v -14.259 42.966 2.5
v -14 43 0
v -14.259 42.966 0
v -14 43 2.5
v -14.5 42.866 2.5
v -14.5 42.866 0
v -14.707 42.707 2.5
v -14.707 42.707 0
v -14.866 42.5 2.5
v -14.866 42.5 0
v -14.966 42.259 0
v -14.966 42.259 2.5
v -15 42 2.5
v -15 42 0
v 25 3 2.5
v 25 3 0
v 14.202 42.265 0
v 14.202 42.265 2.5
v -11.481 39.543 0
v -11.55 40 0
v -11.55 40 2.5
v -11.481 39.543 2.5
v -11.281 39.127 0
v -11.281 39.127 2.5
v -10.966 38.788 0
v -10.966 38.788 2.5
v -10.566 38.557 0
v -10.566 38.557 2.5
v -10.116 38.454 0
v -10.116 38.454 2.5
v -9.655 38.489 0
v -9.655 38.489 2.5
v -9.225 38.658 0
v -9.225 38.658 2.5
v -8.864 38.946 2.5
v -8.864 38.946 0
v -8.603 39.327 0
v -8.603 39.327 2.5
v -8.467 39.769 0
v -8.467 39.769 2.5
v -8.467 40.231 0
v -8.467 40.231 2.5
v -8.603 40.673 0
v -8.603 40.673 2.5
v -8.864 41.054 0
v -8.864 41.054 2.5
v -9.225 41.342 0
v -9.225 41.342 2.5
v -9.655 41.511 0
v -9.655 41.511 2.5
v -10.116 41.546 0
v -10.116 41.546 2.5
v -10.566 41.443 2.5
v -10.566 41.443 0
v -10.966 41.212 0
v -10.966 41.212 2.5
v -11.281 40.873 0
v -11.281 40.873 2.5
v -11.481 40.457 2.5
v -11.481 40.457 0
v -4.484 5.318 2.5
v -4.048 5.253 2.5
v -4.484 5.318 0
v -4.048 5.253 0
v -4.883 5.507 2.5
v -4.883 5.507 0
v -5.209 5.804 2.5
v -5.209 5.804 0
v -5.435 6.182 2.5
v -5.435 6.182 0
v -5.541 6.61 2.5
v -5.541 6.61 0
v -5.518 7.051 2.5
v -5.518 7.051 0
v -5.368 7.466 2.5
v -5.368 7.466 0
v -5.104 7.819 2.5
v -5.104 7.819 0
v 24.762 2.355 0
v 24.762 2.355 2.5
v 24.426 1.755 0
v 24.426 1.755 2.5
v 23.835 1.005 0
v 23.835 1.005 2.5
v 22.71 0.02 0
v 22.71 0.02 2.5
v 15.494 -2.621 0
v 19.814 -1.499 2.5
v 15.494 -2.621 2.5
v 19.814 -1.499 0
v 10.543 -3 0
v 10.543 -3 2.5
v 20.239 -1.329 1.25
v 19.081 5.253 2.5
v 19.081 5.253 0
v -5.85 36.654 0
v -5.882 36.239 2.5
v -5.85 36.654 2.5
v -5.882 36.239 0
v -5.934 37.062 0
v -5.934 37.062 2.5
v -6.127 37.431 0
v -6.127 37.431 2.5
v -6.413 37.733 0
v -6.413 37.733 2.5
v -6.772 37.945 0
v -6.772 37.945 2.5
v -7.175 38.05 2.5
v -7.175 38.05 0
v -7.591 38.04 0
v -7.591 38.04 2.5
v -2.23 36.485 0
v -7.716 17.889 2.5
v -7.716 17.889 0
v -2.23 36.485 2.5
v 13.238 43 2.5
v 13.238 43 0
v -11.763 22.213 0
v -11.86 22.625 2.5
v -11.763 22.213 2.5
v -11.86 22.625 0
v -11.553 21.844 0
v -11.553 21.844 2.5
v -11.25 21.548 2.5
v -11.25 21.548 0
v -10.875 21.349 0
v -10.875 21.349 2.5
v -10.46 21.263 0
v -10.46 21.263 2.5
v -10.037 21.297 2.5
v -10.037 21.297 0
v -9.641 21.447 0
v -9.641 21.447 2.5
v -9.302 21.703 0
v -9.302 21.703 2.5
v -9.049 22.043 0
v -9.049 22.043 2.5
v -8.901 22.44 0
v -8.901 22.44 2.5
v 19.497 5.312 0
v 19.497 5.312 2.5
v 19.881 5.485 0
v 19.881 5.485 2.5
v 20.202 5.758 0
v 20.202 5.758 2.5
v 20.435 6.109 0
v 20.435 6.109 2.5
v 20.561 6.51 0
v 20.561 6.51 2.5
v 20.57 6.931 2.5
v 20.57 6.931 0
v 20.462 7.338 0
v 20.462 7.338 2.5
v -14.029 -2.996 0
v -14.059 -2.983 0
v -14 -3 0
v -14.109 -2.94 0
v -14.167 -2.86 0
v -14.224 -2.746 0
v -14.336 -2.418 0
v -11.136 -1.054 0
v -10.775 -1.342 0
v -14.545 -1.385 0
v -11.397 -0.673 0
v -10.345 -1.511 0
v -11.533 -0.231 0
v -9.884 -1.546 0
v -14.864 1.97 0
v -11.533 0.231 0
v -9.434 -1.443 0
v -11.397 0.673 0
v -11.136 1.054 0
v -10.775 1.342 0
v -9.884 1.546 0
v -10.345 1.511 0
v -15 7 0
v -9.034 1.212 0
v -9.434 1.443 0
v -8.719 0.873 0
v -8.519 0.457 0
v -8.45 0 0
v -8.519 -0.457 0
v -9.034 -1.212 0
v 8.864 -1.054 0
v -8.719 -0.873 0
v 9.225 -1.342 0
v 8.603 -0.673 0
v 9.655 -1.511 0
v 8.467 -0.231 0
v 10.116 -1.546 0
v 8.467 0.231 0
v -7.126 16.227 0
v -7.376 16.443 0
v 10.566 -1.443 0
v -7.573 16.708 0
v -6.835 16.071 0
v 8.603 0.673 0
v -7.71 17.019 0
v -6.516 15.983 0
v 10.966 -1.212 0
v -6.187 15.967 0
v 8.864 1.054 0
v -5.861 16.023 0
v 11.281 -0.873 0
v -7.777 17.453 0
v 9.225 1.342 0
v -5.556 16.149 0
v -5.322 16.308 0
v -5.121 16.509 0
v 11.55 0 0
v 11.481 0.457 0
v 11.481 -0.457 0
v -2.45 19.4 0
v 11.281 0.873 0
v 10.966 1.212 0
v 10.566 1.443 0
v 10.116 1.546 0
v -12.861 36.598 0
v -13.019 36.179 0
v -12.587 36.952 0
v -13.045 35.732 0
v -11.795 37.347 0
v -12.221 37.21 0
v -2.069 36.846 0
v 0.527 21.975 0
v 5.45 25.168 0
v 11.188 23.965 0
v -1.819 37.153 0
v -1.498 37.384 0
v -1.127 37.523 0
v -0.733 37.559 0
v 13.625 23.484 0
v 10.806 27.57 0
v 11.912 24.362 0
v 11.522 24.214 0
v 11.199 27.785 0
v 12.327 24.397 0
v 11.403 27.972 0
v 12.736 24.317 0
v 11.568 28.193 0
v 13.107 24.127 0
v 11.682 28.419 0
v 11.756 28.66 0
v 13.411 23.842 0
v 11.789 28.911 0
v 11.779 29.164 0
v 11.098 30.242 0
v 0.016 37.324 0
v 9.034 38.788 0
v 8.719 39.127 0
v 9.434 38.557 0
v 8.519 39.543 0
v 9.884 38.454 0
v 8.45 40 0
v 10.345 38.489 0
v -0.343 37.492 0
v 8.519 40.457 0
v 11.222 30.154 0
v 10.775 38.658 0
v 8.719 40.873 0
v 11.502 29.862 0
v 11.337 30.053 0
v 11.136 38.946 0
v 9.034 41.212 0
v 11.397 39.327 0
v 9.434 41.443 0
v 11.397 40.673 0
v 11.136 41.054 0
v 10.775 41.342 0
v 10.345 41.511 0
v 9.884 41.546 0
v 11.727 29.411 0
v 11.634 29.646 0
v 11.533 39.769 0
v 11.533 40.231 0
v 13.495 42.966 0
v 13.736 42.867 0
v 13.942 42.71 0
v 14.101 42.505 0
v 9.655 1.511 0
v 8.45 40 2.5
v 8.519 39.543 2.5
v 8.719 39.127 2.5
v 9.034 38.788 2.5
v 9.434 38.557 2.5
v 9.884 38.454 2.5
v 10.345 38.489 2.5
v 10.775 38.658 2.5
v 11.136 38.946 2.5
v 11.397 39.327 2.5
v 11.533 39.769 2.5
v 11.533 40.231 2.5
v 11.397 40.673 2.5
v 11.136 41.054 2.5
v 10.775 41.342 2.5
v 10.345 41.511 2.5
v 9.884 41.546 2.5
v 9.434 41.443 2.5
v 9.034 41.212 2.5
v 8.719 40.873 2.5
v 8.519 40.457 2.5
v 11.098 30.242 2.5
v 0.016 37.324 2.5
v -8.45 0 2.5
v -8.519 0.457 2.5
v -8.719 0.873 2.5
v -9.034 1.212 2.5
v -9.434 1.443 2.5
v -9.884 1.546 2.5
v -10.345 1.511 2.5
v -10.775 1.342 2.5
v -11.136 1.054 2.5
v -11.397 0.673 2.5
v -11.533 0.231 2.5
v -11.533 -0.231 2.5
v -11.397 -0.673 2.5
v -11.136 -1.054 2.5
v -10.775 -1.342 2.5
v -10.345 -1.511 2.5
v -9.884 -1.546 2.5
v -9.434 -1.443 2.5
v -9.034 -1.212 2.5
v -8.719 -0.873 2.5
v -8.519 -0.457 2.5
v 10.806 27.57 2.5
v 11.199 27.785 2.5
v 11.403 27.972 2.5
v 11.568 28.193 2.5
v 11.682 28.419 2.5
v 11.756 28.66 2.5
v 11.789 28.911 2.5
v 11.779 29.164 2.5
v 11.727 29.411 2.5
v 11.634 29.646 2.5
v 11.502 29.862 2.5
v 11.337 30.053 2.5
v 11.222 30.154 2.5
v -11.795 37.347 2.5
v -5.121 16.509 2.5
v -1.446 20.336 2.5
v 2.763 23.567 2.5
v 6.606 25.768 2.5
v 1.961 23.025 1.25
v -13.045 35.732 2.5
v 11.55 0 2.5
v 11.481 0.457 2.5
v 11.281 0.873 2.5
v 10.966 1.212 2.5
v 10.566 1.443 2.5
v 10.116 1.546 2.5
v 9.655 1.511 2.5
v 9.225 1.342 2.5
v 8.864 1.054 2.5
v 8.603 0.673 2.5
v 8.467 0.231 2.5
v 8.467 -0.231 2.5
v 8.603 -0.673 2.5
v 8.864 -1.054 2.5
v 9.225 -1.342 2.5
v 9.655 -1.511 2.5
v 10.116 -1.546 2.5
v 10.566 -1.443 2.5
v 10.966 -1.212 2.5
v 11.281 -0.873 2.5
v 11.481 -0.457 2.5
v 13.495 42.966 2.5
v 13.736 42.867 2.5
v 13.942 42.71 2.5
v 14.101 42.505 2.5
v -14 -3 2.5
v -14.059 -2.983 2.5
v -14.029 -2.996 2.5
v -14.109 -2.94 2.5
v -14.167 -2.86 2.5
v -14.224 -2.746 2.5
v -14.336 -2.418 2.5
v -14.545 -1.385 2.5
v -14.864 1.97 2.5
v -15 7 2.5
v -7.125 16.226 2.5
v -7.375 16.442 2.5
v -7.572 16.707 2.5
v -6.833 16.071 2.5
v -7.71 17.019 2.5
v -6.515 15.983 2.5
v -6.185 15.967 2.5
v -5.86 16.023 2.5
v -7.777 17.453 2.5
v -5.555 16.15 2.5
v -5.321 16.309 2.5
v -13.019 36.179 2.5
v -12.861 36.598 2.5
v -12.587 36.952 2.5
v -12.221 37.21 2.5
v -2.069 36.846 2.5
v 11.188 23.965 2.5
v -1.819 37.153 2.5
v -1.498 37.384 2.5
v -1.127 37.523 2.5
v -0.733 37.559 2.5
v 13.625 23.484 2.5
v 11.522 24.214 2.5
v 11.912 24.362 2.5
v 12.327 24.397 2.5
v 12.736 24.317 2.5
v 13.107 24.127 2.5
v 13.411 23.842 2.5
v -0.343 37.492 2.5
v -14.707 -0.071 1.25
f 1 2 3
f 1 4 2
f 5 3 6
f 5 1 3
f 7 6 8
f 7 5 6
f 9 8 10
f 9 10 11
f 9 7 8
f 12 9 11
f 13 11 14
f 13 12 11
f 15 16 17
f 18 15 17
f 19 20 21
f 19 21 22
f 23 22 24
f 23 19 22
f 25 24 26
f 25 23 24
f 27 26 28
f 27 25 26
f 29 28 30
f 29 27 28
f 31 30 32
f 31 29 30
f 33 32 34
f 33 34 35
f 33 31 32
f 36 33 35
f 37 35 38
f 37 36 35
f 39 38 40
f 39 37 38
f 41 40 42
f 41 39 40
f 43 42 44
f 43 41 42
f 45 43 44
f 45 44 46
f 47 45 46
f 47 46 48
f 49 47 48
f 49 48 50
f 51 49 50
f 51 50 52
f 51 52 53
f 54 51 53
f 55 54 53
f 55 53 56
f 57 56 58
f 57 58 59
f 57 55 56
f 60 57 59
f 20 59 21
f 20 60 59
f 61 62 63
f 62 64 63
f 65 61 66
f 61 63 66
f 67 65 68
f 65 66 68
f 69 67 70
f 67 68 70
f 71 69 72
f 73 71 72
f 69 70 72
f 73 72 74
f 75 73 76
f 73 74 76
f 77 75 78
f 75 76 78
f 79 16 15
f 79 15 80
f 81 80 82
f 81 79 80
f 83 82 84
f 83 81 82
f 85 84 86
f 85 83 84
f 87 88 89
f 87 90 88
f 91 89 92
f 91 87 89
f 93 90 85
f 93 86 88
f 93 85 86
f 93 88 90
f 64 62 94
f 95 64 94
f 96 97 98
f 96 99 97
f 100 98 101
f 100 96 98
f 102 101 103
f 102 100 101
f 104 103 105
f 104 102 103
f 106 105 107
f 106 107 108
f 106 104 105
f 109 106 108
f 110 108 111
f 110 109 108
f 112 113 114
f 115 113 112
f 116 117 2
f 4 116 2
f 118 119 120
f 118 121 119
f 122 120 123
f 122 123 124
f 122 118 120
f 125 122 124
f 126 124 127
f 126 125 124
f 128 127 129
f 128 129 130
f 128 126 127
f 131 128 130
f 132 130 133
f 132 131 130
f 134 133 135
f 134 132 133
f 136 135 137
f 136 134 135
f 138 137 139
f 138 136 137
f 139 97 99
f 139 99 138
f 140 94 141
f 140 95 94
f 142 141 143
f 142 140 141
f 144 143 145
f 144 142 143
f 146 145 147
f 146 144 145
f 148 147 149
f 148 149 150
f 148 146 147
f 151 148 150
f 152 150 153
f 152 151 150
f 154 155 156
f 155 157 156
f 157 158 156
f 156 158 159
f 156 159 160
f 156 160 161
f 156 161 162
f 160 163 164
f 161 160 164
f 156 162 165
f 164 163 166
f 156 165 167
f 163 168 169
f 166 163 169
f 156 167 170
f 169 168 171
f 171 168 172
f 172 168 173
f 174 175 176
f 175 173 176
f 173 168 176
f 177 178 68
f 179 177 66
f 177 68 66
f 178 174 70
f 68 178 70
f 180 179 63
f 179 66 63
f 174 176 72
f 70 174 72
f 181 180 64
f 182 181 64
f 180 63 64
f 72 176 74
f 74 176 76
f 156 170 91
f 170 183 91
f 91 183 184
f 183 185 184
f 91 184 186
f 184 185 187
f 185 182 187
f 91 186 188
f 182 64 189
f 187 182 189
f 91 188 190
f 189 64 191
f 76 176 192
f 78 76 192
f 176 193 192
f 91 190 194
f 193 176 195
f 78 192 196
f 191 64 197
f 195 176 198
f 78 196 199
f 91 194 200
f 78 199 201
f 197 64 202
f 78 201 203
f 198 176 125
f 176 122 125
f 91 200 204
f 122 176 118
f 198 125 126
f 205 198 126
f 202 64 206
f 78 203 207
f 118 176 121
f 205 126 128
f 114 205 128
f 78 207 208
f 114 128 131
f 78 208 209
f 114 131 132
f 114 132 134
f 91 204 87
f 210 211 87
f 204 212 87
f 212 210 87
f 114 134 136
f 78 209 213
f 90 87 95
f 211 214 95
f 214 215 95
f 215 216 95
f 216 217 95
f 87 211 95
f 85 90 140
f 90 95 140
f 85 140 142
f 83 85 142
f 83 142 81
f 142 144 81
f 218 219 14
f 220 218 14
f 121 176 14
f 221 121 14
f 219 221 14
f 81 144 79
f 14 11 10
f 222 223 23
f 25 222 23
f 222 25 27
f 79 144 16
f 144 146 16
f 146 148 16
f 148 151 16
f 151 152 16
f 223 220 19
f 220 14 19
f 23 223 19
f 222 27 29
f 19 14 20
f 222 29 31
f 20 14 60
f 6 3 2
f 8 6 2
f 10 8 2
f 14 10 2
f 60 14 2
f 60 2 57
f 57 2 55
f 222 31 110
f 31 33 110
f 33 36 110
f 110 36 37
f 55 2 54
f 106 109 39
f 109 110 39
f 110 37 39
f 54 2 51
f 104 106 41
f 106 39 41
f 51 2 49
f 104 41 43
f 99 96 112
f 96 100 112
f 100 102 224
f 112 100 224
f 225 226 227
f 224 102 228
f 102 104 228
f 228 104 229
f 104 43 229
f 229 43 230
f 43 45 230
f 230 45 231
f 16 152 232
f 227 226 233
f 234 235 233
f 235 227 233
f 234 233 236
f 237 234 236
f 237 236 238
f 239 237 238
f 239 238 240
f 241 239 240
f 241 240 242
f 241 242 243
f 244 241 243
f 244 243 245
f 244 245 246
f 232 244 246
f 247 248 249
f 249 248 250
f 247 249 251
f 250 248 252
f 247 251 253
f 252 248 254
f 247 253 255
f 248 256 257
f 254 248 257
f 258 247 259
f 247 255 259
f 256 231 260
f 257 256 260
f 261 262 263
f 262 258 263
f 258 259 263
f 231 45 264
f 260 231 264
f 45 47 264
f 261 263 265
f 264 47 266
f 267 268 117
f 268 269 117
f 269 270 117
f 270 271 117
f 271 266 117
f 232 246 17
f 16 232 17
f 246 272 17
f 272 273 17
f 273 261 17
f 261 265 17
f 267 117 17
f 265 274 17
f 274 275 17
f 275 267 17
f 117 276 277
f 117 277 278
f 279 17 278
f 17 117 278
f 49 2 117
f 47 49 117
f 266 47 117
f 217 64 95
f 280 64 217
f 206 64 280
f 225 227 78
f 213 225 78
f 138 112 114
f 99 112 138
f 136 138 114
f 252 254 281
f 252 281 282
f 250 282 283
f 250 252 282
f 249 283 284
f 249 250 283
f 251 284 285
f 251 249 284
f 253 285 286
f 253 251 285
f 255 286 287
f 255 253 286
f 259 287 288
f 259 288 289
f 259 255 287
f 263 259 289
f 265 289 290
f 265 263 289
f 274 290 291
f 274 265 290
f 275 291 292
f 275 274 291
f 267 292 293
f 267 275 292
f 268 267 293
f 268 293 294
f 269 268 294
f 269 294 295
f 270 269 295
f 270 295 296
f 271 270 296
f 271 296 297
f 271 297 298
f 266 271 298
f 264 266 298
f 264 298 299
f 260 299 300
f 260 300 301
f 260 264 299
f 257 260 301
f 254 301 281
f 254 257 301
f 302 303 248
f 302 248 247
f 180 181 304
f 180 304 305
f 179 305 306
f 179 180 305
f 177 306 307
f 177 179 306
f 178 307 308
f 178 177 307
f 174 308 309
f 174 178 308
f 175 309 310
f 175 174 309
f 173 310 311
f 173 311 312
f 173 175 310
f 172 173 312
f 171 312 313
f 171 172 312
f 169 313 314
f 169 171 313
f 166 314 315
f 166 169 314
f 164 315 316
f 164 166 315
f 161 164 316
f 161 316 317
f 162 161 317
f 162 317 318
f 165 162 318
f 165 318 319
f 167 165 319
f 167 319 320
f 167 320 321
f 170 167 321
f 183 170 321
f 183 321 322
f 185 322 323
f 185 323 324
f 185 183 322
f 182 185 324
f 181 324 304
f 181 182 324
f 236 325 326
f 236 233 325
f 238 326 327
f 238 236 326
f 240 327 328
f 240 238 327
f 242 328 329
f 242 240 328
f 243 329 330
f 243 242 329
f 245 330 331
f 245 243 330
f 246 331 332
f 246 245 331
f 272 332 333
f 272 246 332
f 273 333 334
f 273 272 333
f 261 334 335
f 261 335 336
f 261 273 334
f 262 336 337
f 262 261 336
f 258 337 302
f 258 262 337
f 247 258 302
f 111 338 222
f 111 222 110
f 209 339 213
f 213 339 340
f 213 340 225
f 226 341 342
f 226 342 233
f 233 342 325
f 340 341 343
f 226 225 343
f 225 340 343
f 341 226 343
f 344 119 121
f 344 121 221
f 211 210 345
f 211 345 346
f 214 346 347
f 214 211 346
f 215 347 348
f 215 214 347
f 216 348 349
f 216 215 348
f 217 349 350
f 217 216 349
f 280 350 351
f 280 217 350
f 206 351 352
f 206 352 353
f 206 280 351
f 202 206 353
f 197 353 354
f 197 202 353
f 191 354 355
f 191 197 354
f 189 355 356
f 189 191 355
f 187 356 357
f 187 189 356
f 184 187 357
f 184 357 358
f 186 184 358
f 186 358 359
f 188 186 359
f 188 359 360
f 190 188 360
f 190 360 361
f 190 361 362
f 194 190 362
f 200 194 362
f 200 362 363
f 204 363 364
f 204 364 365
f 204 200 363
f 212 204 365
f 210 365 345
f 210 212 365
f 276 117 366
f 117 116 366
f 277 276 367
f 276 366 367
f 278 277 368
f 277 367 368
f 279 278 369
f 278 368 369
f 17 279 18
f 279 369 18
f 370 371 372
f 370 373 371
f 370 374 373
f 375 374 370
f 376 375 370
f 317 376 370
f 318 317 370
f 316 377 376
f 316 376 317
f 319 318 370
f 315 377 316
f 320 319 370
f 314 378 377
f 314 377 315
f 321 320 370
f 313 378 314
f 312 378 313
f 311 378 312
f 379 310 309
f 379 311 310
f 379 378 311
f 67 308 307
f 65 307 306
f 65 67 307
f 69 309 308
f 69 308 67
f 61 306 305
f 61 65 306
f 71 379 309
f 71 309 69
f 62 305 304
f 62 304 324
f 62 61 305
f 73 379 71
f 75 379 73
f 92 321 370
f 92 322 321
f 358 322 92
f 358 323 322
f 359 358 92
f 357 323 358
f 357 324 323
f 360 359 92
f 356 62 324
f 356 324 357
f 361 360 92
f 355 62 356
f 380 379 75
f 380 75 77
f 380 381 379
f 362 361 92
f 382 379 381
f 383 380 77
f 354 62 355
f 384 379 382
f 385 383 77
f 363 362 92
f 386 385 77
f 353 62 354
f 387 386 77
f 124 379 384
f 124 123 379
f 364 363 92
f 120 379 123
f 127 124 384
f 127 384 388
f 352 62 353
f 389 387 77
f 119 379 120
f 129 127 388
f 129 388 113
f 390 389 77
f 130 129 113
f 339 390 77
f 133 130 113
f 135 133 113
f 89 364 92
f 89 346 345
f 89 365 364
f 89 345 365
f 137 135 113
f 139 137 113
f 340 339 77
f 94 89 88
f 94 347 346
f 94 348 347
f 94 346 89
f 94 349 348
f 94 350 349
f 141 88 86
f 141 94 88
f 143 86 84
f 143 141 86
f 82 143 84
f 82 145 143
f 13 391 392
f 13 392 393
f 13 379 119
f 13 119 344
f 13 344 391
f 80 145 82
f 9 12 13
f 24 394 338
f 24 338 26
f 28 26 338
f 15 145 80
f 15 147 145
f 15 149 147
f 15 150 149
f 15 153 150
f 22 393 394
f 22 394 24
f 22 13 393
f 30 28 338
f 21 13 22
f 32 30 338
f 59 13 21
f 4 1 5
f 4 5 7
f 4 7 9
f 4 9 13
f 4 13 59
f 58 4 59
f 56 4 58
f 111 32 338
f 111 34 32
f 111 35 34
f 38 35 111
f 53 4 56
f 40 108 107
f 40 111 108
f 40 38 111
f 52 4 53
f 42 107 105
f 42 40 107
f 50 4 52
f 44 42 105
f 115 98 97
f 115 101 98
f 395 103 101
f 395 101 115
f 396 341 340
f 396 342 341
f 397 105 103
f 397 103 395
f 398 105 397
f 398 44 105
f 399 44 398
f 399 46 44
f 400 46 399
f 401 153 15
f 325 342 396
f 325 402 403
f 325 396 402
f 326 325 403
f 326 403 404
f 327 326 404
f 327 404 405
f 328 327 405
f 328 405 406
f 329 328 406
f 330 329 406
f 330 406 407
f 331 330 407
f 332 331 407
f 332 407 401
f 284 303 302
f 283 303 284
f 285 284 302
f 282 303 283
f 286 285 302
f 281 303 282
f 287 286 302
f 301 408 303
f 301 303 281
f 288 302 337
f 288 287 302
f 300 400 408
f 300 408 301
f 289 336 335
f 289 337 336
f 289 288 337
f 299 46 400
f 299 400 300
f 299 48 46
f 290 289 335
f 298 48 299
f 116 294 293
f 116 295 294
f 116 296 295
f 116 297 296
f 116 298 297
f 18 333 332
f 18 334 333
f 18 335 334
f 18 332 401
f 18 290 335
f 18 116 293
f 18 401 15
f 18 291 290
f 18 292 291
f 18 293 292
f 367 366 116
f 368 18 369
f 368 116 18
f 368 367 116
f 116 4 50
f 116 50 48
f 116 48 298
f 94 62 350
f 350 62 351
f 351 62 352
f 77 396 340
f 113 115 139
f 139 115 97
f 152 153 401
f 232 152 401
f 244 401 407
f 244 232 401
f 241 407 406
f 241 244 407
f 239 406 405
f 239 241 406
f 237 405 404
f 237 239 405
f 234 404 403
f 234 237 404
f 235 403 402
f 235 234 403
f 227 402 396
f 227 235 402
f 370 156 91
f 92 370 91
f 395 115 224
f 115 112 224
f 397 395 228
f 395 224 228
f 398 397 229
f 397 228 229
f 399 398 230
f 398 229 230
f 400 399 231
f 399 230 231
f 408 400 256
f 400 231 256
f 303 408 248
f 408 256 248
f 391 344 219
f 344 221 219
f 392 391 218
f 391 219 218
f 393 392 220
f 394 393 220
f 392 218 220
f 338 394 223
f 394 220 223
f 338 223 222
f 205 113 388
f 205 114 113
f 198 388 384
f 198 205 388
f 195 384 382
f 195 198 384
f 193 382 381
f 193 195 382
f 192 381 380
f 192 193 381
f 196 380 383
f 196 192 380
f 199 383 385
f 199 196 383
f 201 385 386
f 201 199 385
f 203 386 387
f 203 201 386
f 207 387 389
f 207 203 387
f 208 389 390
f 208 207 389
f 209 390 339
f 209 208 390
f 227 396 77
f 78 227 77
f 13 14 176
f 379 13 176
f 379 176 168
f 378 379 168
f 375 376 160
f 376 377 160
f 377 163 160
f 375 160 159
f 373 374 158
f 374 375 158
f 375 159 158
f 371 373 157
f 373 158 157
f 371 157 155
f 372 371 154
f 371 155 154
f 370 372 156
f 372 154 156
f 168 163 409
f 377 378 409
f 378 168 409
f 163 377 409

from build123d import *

# Parameters (mm, degrees)
SKETCH_1_R          = 1.55
EXTRUDE_1_DEPTH     = 2.5
CUT_EXTRUDE_1_DEPTH = 50.802108389
FILLET_1_R          = 1.5
FILLET_START        = -1
FILLET_2_DEPTH      = 4
FILLET_3_SIZE       = 10
FILLET_3_SIZE_2     = 1
FILLET_4_R          = 1


with BuildPart() as part:
    # 草图1 → 凸台-拉伸1 (new body)
    with BuildSketch(Plane.XY):
        Polygon((-15, 3), (-15, -3), (25, -3), (25, 3), (14, 43), (-15, 43), (-15, 37), align=None)
        with Locations((-10, 0)):
            Circle(SKETCH_1_R, mode=Mode.SUBTRACT)
        with Locations((10, 0)):
            Circle(SKETCH_1_R, mode=Mode.SUBTRACT)
        with Locations(Location((10, 40, 0), (0, 0, 180))):
            Circle(SKETCH_1_R, mode=Mode.SUBTRACT)
        with Locations(Location((-10, 40, 0), (0, 0, 180))):
            Circle(SKETCH_1_R, mode=Mode.SUBTRACT)
    extrude(amount=EXTRUDE_1_DEPTH)

    # 草图2 → 切除-拉伸1 (cut, through all)
    with BuildSketch(Plane.XY.offset(2.5)):
        with BuildLine():
            Line((-1.665681913, 38.399108294), (13.765828269, 28.537551491))
            add(Edge.make_bspline(
                [(-10.982655732, 6.815263357), (-3.769805813, 23.449653824), (13.765828269, 28.537551491)],
                knots=[0, 0, 0, 1, 1, 1], degree=2))
            Line((-10.982655732, 6.815263357), (-1.665681913, 38.399108294))
        make_face()
        Polygon((-13.170831516, 37.120758338), (-5.409421069, 38.399108294), (-10.982655732, 12.923419887), align=None)
        Polygon((-7.692188848, 5.253320152), (21.344617293, 5.253320152), (12.761410447, 25.524298024), align=None)
    extrude(amount=-CUT_EXTRUDE_1_DEPTH, mode=Mode.SUBTRACT)

    # 圆角1
    fillet_1_edges = [part.edges().sort_by_distance(p)[0] for p in [
        (13.765828269, 28.537551491, 1.25),
        (-10.982655732, 6.815263357, 1.25),
        (-1.665681913, 38.399108294, 1.25),
        (21.344617293, 5.253320152, 1.25),
        (-5.409421069, 38.399108294, 1.25),
        (-10.982655732, 12.923419887, 1.25),
        (-13.170831516, 37.120758338, 1.25),
        (-7.692188848, 5.253320152, 1.25),
        (12.761410447, 25.524298024, 1.25),
    ]]
    fillet(fillet_1_edges, radius=FILLET_1_R)

    # 圆角2: read off the stored shape, not the designer's step
    # 圆角2 outline → 圆角2 (cut)
    with BuildSketch(Plane.XY.offset(FILLET_START)):
        with BuildLine():
            Line((25, -3), (25, 3))
            add(Edge.make_bspline(
                [(25, 3), (23.339885287, -3), (10.543167705, -3)],
                knots=[0, 0, 0, 1, 1, 1], degree=2, weights=[1, 0.795822426, 1]))
            Line((10.543167705, -3), (25, -3))
        make_face()
    extrude(amount=FILLET_2_DEPTH, mode=Mode.SUBTRACT)

    # 圆角3
    # a fillet whose section is not a circle: 10, 1 mm, written as the material it takes off along each edge
    with BuildSketch(Plane(origin=(-15, -3, -25), x_dir=(0, 1, 0), z_dir=(0, 0, 1))) as fillet_3_piece_1:
        with BuildLine():
            Bezier((FILLET_3_SIZE, 0), (0, 0), (0, -FILLET_3_SIZE_2), weights=[1, 0.707106781, 1])
            Line((0, -FILLET_3_SIZE_2), (0, 0))
            Line((0, 0), (FILLET_3_SIZE, 0))
        make_face()
    extrude(amount=52.5, mode=Mode.SUBTRACT)

    # 圆角4
    fillet_4_edges = [part.edges().sort_by_distance(p)[0] for p in [
        (14, 43, 1.25),
        (-15, 43, 1.25),
    ]]
    fillet(fillet_4_edges, radius=FILLET_4_R)


solid = part.part
